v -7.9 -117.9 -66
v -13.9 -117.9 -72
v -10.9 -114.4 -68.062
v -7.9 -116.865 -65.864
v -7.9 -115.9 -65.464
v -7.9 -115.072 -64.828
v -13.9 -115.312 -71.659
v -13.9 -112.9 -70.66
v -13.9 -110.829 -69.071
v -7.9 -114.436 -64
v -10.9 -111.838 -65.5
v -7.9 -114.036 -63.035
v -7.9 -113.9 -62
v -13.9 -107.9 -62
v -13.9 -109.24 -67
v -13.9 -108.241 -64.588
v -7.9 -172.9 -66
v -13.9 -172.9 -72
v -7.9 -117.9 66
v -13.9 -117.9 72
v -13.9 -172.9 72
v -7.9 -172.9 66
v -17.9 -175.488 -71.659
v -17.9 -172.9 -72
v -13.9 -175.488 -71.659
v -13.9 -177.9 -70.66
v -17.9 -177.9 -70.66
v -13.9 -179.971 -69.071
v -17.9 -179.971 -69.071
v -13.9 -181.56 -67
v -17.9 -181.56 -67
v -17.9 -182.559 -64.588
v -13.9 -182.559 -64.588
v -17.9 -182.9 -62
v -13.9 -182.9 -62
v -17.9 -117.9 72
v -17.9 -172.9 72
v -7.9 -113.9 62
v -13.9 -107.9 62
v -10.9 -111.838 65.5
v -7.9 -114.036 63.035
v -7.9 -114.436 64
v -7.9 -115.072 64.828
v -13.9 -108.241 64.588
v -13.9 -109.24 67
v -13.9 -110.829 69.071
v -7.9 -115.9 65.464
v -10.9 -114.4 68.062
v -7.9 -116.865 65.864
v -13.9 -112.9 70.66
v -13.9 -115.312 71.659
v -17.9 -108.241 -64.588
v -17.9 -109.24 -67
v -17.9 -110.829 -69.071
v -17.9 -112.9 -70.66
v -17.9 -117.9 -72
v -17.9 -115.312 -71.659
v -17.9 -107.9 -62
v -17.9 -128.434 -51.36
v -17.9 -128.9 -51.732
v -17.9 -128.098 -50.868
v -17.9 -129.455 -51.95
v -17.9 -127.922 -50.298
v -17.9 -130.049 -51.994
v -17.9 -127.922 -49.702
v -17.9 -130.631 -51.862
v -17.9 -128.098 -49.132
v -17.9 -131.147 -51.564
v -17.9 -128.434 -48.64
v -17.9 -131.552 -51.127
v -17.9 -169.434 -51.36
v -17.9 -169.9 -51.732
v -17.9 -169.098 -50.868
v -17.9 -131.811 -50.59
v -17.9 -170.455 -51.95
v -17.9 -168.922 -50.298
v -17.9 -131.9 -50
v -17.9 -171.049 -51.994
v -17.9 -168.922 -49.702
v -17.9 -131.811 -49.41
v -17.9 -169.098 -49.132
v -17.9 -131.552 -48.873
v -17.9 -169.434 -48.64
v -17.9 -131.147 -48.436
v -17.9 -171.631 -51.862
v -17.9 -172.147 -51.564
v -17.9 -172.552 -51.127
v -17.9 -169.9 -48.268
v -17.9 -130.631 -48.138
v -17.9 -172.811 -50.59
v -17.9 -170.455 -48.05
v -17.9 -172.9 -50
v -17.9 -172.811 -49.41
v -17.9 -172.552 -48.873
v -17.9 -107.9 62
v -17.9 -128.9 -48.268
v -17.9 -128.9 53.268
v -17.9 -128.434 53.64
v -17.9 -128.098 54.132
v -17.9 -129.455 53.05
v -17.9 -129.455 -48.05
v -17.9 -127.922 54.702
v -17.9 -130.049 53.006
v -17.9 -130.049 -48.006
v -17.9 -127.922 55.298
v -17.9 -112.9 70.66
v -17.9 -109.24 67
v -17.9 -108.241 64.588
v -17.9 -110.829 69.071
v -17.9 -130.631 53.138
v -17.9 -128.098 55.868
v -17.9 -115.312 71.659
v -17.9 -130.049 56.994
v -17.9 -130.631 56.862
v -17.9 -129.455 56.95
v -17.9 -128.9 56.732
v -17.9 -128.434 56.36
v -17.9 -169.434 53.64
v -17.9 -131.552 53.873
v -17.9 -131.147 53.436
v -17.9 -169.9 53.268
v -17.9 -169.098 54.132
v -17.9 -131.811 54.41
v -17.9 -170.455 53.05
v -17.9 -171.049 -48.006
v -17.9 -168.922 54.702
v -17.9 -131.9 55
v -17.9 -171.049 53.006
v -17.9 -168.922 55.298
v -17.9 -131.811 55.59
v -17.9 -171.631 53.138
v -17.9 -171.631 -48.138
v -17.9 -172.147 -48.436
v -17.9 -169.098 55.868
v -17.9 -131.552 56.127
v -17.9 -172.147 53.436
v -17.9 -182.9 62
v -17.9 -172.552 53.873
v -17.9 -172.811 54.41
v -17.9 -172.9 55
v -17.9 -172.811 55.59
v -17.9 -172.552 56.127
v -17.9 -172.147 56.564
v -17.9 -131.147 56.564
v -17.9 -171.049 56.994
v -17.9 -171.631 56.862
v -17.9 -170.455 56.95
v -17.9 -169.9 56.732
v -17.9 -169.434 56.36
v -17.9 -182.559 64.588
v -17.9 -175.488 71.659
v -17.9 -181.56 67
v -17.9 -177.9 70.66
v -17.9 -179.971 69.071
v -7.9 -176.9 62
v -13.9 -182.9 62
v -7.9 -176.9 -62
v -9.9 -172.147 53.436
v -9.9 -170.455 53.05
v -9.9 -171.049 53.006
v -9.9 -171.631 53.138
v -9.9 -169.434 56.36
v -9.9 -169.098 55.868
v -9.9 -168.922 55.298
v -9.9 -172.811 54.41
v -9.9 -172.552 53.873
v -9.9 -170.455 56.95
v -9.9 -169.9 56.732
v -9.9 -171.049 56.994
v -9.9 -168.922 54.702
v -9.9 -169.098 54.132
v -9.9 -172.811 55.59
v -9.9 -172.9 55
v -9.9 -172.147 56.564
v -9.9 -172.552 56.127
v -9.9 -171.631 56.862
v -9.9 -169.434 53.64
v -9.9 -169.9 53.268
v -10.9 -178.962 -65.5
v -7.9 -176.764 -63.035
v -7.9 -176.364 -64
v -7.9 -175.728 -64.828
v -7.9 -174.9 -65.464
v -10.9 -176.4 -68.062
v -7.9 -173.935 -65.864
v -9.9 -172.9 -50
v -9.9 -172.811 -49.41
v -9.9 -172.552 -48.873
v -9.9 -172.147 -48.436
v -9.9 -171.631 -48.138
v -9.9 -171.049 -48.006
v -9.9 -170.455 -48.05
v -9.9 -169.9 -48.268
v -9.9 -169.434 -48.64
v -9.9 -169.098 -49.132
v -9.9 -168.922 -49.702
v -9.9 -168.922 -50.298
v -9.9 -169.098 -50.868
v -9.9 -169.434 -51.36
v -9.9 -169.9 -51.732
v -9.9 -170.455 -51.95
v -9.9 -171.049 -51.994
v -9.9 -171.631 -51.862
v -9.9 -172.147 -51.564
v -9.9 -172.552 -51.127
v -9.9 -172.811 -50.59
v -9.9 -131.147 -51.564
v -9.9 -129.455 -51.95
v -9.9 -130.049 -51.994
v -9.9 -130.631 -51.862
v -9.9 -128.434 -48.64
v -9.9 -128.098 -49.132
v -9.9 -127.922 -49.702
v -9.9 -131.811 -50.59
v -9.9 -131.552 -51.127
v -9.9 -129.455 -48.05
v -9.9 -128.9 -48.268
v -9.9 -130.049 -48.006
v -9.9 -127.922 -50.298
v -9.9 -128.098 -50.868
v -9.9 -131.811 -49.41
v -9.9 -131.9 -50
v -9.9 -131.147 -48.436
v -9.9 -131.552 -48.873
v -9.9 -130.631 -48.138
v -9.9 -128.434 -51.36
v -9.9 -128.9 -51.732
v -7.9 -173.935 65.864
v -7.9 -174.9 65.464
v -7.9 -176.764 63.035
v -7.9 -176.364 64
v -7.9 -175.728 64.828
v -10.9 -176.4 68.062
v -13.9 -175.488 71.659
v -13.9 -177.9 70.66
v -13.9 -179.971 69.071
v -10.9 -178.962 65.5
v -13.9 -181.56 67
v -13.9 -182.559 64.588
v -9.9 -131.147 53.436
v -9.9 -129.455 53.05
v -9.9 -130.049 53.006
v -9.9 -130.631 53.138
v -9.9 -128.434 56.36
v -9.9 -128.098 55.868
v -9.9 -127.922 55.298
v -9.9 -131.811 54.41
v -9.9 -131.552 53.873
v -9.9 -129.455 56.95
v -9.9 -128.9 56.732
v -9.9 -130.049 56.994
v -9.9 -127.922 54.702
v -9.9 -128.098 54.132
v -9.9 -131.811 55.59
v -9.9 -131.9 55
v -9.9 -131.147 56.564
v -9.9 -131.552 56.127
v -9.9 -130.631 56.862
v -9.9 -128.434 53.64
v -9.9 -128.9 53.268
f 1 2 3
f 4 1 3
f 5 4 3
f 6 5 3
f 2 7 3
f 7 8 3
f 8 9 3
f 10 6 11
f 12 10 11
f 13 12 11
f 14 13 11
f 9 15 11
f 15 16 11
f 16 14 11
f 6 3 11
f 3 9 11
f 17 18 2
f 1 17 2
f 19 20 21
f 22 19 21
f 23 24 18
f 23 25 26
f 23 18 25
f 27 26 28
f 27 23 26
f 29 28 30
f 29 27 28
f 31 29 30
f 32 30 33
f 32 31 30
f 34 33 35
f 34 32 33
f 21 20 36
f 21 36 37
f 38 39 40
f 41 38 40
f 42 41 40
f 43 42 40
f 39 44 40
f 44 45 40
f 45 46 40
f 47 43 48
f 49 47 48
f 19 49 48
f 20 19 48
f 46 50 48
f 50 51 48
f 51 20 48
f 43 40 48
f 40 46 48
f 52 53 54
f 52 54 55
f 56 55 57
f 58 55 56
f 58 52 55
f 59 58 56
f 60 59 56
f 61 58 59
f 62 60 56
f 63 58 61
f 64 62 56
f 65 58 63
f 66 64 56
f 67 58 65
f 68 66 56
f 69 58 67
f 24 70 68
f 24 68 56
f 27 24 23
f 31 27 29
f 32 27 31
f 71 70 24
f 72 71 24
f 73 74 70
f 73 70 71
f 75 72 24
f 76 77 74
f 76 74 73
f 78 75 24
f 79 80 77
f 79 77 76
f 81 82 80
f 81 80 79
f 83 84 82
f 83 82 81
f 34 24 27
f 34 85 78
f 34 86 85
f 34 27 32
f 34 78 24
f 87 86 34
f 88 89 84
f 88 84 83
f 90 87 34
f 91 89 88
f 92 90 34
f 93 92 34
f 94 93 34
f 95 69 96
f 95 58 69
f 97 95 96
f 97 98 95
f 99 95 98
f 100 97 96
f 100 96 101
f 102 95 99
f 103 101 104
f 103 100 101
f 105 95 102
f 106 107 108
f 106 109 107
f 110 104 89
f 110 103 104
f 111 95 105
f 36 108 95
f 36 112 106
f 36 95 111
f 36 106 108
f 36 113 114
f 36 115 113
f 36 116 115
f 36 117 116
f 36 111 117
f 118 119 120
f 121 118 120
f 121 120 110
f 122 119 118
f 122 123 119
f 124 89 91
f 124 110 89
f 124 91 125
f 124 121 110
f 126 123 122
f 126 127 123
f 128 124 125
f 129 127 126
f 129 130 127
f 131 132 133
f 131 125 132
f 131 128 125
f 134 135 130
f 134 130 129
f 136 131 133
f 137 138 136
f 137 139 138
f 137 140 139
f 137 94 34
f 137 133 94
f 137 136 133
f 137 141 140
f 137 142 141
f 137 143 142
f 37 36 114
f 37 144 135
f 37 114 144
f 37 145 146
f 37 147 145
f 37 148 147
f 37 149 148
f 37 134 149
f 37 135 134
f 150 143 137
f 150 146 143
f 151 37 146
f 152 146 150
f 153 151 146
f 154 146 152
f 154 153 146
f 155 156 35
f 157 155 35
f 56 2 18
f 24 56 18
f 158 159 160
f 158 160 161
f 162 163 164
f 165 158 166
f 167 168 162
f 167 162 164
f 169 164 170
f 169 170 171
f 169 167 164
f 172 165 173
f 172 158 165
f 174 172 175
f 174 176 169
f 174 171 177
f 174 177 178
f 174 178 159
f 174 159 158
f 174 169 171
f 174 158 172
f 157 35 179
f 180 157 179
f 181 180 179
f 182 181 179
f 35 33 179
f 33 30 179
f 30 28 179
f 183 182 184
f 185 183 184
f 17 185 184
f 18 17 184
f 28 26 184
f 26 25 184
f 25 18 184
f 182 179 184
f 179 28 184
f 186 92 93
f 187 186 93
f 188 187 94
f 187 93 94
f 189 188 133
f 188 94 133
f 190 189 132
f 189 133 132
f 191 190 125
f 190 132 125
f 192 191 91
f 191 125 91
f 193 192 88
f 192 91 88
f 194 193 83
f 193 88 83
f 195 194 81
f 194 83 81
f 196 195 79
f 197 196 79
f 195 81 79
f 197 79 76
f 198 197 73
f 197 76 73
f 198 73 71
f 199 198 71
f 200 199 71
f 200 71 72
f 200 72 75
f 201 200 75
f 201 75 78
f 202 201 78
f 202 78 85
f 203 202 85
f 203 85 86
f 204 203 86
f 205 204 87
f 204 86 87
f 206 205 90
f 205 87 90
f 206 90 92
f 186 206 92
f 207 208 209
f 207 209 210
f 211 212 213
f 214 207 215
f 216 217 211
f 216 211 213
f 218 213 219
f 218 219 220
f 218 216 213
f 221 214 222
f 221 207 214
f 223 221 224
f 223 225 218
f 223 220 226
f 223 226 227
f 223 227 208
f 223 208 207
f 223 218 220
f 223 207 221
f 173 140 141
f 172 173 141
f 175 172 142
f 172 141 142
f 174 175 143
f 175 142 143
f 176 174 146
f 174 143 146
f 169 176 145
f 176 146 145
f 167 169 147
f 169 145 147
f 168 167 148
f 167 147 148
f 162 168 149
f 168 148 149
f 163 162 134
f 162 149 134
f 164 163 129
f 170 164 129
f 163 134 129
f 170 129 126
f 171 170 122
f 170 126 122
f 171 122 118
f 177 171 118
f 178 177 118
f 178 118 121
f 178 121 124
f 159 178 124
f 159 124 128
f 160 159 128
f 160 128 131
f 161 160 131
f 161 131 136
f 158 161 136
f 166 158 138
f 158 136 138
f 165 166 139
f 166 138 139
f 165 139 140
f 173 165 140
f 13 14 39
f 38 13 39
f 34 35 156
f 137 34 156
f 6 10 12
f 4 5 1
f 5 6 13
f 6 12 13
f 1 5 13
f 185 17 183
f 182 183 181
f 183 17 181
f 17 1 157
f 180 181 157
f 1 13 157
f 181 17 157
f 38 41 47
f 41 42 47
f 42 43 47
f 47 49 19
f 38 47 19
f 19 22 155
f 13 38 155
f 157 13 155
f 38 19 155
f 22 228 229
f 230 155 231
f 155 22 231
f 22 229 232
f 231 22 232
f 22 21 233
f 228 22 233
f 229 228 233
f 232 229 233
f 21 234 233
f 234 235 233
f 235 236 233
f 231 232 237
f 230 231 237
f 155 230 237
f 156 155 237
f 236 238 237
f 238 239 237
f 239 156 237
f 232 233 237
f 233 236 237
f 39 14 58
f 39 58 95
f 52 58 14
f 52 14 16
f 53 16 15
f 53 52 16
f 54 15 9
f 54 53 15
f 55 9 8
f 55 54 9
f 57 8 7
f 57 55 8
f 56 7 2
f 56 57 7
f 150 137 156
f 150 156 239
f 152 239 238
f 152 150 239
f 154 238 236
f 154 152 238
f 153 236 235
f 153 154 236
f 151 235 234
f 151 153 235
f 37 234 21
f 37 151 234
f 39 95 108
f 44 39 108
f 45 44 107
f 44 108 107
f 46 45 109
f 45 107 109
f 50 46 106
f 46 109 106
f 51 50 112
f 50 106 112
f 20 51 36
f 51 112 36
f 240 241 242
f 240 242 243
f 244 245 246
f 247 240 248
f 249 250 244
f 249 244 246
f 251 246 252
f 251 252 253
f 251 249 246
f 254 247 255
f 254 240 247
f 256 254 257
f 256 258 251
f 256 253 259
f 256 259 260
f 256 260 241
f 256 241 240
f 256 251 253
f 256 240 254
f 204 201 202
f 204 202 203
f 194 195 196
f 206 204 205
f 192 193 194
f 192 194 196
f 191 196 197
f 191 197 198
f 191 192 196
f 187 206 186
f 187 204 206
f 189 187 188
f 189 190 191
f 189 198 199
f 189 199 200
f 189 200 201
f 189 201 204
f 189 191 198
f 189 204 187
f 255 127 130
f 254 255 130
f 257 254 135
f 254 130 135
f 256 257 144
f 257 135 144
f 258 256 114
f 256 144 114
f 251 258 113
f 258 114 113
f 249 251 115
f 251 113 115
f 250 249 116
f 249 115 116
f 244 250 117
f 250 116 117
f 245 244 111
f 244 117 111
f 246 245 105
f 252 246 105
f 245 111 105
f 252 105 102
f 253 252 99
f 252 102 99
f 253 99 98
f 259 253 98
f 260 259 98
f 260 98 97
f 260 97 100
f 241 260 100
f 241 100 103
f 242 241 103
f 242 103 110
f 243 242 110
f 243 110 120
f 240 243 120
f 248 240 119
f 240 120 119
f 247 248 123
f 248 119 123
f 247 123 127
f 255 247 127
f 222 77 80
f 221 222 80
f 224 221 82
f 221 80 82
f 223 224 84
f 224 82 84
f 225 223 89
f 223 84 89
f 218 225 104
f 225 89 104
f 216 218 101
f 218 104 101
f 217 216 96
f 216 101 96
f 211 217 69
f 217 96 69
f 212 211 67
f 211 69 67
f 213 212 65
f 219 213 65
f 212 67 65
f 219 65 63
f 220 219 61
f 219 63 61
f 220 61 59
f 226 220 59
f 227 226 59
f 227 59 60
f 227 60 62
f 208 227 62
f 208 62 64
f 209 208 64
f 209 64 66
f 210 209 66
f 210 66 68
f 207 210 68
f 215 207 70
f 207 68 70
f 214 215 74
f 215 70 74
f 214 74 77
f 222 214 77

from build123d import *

# Parameters (mm, degrees)
SKETCH156_W             = 75
SKETCH156_H             = 144
PAD044_DEPTH            = 10
FILLET024_R             = 10
CHAMFER009_SIZE         = 6
SKETCH164_R             = 2
POCKET055_DEPTH         = 8
BODY015_PLACEMENT_ANGLE = 180


with BuildPart() as part:
    # Sketch156 → Pad044 (new body)
    with BuildSketch(Plane.YZ):
        with Locations((0.5, 0)):
            Rectangle(SKETCH156_W, SKETCH156_H)
    extrude(amount=PAD044_DEPTH)

    # Fillet024
    fillet024_edges = [part.edges().sort_by_distance(p)[0] for p in [
        (5, 38, -72),
        (5, -37, -72),
        (5, -37, 72),
        (5, 38, 72),
    ]]
    fillet(fillet024_edges, radius=FILLET024_R)

    # Chamfer009
    chamfer009_edges = [part.edges().sort_by_distance(p)[0] for p in [
        (0, 0.5, 72),
        (0, -37, 0),
        (0, 38, 0),
        (0, 0.5, -72),
    ]]
    chamfer(chamfer009_edges, length=CHAMFER009_SIZE)

    # Sketch164 (on Face4 of Chamfer009) → Pocket055 (cut)
    with BuildSketch(Plane.YZ.offset(10)):
        with Locations((-15, 55)):
            Circle(SKETCH164_R)
        with Locations((26, 55)):
            Circle(SKETCH164_R)
        with Locations((-15, -50)):
            Circle(SKETCH164_R)
        with Locations((26, -50)):
            Circle(SKETCH164_R)
    extrude(amount=-POCKET055_DEPTH, mode=Mode.SUBTRACT)


with BuildPart() as part_1:
    # Body015 placement: moved
    add(part.part.moved(Location((-7.9, -144.9, 0))).rotate(Axis((-7.9, -144.9, 0), (0, 0, 1)), BODY015_PLACEMENT_ANGLE))


solid = part_1.part
